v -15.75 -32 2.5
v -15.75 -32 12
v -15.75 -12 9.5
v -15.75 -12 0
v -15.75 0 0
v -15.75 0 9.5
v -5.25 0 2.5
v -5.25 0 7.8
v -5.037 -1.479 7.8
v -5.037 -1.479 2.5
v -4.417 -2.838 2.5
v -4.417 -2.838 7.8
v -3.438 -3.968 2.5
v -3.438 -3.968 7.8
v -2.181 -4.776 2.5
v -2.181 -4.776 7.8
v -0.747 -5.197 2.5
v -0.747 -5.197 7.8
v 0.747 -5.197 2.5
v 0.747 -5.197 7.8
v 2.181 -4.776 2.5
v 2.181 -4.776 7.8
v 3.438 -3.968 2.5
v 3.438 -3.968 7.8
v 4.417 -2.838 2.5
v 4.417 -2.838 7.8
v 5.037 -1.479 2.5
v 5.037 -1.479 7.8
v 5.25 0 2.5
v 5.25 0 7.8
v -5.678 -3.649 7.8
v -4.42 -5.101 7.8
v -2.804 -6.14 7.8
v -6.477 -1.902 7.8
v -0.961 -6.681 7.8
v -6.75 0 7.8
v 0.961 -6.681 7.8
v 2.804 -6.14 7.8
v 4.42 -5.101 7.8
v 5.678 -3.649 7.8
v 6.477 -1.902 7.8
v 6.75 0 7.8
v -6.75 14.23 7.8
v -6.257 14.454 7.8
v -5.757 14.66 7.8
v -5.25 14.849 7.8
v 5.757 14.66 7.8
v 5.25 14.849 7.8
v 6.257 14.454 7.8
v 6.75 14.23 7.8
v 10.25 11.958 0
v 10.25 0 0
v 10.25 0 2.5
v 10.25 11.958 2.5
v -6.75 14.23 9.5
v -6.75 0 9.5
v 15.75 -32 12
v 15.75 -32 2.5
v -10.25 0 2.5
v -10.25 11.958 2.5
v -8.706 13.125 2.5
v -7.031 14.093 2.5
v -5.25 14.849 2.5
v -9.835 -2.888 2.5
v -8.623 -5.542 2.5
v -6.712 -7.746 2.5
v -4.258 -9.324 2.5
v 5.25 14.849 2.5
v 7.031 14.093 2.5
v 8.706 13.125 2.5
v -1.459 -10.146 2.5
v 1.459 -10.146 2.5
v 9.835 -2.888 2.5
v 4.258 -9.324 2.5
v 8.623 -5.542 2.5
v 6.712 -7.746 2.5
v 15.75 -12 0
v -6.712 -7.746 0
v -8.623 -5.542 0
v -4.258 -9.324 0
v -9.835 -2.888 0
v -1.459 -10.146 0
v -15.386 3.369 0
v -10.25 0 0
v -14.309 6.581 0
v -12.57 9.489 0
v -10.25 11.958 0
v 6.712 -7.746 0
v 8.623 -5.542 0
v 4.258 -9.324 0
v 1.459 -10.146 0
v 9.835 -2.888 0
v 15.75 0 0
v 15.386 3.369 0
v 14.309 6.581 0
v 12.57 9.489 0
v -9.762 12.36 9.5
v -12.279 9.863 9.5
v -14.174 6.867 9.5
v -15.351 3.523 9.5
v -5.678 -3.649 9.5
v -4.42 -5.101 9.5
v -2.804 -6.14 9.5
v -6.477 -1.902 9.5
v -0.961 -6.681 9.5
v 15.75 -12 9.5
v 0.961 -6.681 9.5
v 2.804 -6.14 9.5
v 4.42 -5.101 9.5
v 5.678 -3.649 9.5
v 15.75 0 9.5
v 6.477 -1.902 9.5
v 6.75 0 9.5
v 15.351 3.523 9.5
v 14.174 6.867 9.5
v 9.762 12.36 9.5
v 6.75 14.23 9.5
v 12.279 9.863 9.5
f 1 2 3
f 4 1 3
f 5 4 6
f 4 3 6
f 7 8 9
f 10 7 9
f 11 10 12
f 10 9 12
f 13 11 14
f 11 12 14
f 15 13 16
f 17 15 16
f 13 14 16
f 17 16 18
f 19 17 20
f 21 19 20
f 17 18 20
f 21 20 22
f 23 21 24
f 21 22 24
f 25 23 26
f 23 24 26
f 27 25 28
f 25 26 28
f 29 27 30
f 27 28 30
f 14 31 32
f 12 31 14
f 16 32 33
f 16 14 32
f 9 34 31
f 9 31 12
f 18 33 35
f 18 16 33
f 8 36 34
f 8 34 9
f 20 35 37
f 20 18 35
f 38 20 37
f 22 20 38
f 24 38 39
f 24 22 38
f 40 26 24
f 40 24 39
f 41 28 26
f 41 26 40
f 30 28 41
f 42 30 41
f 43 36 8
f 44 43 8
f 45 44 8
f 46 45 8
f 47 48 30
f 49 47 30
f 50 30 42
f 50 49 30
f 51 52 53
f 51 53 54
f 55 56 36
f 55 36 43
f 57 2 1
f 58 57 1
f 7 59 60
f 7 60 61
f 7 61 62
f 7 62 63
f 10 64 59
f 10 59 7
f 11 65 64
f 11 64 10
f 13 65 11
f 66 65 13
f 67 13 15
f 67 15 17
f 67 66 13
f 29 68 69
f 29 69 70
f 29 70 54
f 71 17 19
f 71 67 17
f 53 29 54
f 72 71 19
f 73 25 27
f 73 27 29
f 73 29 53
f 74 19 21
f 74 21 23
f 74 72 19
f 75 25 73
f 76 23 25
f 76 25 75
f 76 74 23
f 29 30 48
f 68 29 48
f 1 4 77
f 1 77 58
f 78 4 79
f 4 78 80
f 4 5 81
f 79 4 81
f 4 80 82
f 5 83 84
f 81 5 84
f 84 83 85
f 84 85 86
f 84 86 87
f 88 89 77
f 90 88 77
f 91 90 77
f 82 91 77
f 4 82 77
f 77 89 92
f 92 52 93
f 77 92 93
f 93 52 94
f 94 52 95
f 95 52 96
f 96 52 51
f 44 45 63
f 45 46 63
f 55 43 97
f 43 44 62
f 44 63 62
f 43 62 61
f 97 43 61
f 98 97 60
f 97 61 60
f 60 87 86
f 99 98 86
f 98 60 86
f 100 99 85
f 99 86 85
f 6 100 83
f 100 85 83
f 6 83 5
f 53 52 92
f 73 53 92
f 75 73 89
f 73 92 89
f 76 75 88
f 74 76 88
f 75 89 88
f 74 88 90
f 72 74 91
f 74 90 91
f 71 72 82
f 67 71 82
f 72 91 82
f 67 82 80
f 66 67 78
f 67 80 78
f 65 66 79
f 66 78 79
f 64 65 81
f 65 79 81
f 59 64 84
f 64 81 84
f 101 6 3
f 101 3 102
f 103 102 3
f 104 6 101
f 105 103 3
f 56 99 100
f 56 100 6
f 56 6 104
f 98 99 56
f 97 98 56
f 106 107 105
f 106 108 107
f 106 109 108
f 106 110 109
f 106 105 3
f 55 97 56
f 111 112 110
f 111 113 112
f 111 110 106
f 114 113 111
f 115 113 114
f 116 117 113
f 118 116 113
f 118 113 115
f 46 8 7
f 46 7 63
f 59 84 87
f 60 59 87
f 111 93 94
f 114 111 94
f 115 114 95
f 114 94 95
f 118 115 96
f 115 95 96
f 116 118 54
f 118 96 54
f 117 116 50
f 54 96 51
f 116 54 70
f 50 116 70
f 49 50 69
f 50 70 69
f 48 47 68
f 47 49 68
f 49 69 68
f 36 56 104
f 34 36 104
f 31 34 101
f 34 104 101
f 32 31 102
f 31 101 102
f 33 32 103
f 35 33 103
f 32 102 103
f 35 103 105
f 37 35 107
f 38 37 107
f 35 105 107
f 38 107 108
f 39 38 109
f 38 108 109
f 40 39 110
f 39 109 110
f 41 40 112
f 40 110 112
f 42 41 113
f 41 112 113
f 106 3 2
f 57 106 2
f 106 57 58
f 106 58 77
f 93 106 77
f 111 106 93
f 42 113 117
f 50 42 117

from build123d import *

# Parameters (mm, degrees)
PAD_DEPTH            = 9.5
POCKET_DEPTH         = 1.7
POCKET001_DEPTH      = 100
POCKET001_DEPTH_BACK = 100
POCKET002_DEPTH      = 2.5
POCKET003_DEPTH      = 100
POCKET003_DEPTH_BACK = 100
PAD001_DEPTH         = 31.5


with BuildPart() as part:
    # Sketch → Pad (new body)
    with BuildSketch(Plane.XY):
        with BuildLine():
            ThreePointArc((15.75, 0), (0, 15.75), (-15.75, 0))
            Line((-15.75, 0), (-15.75, -32))
            Line((-15.75, -32), (15.75, -32))
            Line((15.75, 0), (15.75, -32))
        make_face()
    extrude(amount=PAD_DEPTH)

    # Sketch002 (on Face6 of Pad) → Pocket (cut)
    with BuildSketch(Plane.XY.offset(9.5)):
        with BuildLine():
            ThreePointArc((-6.75, 0), (0, -6.75), (6.75, 0))
            Line((6.75, 0), (6.75, 32))
            Line((-6.75, 32), (6.75, 32))
            Line((-6.75, 0), (-6.75, 32))
        make_face()
    extrude(amount=-POCKET_DEPTH, mode=Mode.SUBTRACT)

    # Sketch001 (on Face6 of Pad) → Pocket001 (cut, two sides)
    with BuildSketch(Plane.XY.offset(9.5)) as pocket001_sk:
        with BuildLine():
            ThreePointArc((-5.25, 0), (0, -5.25), (5.25, 0))
            Line((5.25, 0), (5.25, 32))
            Line((-5.25, 32), (5.25, 32))
            Line((-5.25, 0), (-5.25, 32))
        make_face()
    extrude(amount=-POCKET001_DEPTH, mode=Mode.SUBTRACT)
    extrude(pocket001_sk.sketch, amount=POCKET001_DEPTH_BACK, mode=Mode.SUBTRACT)

    # Sketch003 (on Face2 of Pocket001) → Pocket002 (cut)
    with BuildSketch(Plane(origin=(0, 0, 0), x_dir=(1, 0, 0), z_dir=(0, 0, -1))):
        with BuildLine():
            ThreePointArc((10.25, 0), (0, 10.25), (-10.25, 0))
            Line((-10.25, 0), (-10.25, -32))
            Line((-10.25, -32), (10.25, -32))
            Line((10.25, 0), (10.25, -32))
        make_face()
    extrude(amount=-POCKET002_DEPTH, mode=Mode.SUBTRACT)

    # Sketch004 (on Face11 of Pocket002) → Pocket003 (cut, two sides)
    with BuildSketch(Plane(origin=(-15.75, 0, 0), x_dir=(0, -1, 0), z_dir=(-1, 0, 0))) as pocket003_sk:
        Polygon((12, 0), (32, 2.5), (32, 0), align=None)
    extrude(amount=-POCKET003_DEPTH, mode=Mode.SUBTRACT)
    extrude(pocket003_sk.sketch, amount=POCKET003_DEPTH_BACK, mode=Mode.SUBTRACT)

    # Sketch005 (on Face11 of Pocket003) → Pad001 (join)
    with BuildSketch(Plane(origin=(-15.75, 0, 0), x_dir=(0, -1, 0), z_dir=(-1, 0, 0))):
        Polygon((12, 9.5), (32, 12), (32, 9.5), align=None)
    extrude(amount=-PAD001_DEPTH)


solid = part.part
